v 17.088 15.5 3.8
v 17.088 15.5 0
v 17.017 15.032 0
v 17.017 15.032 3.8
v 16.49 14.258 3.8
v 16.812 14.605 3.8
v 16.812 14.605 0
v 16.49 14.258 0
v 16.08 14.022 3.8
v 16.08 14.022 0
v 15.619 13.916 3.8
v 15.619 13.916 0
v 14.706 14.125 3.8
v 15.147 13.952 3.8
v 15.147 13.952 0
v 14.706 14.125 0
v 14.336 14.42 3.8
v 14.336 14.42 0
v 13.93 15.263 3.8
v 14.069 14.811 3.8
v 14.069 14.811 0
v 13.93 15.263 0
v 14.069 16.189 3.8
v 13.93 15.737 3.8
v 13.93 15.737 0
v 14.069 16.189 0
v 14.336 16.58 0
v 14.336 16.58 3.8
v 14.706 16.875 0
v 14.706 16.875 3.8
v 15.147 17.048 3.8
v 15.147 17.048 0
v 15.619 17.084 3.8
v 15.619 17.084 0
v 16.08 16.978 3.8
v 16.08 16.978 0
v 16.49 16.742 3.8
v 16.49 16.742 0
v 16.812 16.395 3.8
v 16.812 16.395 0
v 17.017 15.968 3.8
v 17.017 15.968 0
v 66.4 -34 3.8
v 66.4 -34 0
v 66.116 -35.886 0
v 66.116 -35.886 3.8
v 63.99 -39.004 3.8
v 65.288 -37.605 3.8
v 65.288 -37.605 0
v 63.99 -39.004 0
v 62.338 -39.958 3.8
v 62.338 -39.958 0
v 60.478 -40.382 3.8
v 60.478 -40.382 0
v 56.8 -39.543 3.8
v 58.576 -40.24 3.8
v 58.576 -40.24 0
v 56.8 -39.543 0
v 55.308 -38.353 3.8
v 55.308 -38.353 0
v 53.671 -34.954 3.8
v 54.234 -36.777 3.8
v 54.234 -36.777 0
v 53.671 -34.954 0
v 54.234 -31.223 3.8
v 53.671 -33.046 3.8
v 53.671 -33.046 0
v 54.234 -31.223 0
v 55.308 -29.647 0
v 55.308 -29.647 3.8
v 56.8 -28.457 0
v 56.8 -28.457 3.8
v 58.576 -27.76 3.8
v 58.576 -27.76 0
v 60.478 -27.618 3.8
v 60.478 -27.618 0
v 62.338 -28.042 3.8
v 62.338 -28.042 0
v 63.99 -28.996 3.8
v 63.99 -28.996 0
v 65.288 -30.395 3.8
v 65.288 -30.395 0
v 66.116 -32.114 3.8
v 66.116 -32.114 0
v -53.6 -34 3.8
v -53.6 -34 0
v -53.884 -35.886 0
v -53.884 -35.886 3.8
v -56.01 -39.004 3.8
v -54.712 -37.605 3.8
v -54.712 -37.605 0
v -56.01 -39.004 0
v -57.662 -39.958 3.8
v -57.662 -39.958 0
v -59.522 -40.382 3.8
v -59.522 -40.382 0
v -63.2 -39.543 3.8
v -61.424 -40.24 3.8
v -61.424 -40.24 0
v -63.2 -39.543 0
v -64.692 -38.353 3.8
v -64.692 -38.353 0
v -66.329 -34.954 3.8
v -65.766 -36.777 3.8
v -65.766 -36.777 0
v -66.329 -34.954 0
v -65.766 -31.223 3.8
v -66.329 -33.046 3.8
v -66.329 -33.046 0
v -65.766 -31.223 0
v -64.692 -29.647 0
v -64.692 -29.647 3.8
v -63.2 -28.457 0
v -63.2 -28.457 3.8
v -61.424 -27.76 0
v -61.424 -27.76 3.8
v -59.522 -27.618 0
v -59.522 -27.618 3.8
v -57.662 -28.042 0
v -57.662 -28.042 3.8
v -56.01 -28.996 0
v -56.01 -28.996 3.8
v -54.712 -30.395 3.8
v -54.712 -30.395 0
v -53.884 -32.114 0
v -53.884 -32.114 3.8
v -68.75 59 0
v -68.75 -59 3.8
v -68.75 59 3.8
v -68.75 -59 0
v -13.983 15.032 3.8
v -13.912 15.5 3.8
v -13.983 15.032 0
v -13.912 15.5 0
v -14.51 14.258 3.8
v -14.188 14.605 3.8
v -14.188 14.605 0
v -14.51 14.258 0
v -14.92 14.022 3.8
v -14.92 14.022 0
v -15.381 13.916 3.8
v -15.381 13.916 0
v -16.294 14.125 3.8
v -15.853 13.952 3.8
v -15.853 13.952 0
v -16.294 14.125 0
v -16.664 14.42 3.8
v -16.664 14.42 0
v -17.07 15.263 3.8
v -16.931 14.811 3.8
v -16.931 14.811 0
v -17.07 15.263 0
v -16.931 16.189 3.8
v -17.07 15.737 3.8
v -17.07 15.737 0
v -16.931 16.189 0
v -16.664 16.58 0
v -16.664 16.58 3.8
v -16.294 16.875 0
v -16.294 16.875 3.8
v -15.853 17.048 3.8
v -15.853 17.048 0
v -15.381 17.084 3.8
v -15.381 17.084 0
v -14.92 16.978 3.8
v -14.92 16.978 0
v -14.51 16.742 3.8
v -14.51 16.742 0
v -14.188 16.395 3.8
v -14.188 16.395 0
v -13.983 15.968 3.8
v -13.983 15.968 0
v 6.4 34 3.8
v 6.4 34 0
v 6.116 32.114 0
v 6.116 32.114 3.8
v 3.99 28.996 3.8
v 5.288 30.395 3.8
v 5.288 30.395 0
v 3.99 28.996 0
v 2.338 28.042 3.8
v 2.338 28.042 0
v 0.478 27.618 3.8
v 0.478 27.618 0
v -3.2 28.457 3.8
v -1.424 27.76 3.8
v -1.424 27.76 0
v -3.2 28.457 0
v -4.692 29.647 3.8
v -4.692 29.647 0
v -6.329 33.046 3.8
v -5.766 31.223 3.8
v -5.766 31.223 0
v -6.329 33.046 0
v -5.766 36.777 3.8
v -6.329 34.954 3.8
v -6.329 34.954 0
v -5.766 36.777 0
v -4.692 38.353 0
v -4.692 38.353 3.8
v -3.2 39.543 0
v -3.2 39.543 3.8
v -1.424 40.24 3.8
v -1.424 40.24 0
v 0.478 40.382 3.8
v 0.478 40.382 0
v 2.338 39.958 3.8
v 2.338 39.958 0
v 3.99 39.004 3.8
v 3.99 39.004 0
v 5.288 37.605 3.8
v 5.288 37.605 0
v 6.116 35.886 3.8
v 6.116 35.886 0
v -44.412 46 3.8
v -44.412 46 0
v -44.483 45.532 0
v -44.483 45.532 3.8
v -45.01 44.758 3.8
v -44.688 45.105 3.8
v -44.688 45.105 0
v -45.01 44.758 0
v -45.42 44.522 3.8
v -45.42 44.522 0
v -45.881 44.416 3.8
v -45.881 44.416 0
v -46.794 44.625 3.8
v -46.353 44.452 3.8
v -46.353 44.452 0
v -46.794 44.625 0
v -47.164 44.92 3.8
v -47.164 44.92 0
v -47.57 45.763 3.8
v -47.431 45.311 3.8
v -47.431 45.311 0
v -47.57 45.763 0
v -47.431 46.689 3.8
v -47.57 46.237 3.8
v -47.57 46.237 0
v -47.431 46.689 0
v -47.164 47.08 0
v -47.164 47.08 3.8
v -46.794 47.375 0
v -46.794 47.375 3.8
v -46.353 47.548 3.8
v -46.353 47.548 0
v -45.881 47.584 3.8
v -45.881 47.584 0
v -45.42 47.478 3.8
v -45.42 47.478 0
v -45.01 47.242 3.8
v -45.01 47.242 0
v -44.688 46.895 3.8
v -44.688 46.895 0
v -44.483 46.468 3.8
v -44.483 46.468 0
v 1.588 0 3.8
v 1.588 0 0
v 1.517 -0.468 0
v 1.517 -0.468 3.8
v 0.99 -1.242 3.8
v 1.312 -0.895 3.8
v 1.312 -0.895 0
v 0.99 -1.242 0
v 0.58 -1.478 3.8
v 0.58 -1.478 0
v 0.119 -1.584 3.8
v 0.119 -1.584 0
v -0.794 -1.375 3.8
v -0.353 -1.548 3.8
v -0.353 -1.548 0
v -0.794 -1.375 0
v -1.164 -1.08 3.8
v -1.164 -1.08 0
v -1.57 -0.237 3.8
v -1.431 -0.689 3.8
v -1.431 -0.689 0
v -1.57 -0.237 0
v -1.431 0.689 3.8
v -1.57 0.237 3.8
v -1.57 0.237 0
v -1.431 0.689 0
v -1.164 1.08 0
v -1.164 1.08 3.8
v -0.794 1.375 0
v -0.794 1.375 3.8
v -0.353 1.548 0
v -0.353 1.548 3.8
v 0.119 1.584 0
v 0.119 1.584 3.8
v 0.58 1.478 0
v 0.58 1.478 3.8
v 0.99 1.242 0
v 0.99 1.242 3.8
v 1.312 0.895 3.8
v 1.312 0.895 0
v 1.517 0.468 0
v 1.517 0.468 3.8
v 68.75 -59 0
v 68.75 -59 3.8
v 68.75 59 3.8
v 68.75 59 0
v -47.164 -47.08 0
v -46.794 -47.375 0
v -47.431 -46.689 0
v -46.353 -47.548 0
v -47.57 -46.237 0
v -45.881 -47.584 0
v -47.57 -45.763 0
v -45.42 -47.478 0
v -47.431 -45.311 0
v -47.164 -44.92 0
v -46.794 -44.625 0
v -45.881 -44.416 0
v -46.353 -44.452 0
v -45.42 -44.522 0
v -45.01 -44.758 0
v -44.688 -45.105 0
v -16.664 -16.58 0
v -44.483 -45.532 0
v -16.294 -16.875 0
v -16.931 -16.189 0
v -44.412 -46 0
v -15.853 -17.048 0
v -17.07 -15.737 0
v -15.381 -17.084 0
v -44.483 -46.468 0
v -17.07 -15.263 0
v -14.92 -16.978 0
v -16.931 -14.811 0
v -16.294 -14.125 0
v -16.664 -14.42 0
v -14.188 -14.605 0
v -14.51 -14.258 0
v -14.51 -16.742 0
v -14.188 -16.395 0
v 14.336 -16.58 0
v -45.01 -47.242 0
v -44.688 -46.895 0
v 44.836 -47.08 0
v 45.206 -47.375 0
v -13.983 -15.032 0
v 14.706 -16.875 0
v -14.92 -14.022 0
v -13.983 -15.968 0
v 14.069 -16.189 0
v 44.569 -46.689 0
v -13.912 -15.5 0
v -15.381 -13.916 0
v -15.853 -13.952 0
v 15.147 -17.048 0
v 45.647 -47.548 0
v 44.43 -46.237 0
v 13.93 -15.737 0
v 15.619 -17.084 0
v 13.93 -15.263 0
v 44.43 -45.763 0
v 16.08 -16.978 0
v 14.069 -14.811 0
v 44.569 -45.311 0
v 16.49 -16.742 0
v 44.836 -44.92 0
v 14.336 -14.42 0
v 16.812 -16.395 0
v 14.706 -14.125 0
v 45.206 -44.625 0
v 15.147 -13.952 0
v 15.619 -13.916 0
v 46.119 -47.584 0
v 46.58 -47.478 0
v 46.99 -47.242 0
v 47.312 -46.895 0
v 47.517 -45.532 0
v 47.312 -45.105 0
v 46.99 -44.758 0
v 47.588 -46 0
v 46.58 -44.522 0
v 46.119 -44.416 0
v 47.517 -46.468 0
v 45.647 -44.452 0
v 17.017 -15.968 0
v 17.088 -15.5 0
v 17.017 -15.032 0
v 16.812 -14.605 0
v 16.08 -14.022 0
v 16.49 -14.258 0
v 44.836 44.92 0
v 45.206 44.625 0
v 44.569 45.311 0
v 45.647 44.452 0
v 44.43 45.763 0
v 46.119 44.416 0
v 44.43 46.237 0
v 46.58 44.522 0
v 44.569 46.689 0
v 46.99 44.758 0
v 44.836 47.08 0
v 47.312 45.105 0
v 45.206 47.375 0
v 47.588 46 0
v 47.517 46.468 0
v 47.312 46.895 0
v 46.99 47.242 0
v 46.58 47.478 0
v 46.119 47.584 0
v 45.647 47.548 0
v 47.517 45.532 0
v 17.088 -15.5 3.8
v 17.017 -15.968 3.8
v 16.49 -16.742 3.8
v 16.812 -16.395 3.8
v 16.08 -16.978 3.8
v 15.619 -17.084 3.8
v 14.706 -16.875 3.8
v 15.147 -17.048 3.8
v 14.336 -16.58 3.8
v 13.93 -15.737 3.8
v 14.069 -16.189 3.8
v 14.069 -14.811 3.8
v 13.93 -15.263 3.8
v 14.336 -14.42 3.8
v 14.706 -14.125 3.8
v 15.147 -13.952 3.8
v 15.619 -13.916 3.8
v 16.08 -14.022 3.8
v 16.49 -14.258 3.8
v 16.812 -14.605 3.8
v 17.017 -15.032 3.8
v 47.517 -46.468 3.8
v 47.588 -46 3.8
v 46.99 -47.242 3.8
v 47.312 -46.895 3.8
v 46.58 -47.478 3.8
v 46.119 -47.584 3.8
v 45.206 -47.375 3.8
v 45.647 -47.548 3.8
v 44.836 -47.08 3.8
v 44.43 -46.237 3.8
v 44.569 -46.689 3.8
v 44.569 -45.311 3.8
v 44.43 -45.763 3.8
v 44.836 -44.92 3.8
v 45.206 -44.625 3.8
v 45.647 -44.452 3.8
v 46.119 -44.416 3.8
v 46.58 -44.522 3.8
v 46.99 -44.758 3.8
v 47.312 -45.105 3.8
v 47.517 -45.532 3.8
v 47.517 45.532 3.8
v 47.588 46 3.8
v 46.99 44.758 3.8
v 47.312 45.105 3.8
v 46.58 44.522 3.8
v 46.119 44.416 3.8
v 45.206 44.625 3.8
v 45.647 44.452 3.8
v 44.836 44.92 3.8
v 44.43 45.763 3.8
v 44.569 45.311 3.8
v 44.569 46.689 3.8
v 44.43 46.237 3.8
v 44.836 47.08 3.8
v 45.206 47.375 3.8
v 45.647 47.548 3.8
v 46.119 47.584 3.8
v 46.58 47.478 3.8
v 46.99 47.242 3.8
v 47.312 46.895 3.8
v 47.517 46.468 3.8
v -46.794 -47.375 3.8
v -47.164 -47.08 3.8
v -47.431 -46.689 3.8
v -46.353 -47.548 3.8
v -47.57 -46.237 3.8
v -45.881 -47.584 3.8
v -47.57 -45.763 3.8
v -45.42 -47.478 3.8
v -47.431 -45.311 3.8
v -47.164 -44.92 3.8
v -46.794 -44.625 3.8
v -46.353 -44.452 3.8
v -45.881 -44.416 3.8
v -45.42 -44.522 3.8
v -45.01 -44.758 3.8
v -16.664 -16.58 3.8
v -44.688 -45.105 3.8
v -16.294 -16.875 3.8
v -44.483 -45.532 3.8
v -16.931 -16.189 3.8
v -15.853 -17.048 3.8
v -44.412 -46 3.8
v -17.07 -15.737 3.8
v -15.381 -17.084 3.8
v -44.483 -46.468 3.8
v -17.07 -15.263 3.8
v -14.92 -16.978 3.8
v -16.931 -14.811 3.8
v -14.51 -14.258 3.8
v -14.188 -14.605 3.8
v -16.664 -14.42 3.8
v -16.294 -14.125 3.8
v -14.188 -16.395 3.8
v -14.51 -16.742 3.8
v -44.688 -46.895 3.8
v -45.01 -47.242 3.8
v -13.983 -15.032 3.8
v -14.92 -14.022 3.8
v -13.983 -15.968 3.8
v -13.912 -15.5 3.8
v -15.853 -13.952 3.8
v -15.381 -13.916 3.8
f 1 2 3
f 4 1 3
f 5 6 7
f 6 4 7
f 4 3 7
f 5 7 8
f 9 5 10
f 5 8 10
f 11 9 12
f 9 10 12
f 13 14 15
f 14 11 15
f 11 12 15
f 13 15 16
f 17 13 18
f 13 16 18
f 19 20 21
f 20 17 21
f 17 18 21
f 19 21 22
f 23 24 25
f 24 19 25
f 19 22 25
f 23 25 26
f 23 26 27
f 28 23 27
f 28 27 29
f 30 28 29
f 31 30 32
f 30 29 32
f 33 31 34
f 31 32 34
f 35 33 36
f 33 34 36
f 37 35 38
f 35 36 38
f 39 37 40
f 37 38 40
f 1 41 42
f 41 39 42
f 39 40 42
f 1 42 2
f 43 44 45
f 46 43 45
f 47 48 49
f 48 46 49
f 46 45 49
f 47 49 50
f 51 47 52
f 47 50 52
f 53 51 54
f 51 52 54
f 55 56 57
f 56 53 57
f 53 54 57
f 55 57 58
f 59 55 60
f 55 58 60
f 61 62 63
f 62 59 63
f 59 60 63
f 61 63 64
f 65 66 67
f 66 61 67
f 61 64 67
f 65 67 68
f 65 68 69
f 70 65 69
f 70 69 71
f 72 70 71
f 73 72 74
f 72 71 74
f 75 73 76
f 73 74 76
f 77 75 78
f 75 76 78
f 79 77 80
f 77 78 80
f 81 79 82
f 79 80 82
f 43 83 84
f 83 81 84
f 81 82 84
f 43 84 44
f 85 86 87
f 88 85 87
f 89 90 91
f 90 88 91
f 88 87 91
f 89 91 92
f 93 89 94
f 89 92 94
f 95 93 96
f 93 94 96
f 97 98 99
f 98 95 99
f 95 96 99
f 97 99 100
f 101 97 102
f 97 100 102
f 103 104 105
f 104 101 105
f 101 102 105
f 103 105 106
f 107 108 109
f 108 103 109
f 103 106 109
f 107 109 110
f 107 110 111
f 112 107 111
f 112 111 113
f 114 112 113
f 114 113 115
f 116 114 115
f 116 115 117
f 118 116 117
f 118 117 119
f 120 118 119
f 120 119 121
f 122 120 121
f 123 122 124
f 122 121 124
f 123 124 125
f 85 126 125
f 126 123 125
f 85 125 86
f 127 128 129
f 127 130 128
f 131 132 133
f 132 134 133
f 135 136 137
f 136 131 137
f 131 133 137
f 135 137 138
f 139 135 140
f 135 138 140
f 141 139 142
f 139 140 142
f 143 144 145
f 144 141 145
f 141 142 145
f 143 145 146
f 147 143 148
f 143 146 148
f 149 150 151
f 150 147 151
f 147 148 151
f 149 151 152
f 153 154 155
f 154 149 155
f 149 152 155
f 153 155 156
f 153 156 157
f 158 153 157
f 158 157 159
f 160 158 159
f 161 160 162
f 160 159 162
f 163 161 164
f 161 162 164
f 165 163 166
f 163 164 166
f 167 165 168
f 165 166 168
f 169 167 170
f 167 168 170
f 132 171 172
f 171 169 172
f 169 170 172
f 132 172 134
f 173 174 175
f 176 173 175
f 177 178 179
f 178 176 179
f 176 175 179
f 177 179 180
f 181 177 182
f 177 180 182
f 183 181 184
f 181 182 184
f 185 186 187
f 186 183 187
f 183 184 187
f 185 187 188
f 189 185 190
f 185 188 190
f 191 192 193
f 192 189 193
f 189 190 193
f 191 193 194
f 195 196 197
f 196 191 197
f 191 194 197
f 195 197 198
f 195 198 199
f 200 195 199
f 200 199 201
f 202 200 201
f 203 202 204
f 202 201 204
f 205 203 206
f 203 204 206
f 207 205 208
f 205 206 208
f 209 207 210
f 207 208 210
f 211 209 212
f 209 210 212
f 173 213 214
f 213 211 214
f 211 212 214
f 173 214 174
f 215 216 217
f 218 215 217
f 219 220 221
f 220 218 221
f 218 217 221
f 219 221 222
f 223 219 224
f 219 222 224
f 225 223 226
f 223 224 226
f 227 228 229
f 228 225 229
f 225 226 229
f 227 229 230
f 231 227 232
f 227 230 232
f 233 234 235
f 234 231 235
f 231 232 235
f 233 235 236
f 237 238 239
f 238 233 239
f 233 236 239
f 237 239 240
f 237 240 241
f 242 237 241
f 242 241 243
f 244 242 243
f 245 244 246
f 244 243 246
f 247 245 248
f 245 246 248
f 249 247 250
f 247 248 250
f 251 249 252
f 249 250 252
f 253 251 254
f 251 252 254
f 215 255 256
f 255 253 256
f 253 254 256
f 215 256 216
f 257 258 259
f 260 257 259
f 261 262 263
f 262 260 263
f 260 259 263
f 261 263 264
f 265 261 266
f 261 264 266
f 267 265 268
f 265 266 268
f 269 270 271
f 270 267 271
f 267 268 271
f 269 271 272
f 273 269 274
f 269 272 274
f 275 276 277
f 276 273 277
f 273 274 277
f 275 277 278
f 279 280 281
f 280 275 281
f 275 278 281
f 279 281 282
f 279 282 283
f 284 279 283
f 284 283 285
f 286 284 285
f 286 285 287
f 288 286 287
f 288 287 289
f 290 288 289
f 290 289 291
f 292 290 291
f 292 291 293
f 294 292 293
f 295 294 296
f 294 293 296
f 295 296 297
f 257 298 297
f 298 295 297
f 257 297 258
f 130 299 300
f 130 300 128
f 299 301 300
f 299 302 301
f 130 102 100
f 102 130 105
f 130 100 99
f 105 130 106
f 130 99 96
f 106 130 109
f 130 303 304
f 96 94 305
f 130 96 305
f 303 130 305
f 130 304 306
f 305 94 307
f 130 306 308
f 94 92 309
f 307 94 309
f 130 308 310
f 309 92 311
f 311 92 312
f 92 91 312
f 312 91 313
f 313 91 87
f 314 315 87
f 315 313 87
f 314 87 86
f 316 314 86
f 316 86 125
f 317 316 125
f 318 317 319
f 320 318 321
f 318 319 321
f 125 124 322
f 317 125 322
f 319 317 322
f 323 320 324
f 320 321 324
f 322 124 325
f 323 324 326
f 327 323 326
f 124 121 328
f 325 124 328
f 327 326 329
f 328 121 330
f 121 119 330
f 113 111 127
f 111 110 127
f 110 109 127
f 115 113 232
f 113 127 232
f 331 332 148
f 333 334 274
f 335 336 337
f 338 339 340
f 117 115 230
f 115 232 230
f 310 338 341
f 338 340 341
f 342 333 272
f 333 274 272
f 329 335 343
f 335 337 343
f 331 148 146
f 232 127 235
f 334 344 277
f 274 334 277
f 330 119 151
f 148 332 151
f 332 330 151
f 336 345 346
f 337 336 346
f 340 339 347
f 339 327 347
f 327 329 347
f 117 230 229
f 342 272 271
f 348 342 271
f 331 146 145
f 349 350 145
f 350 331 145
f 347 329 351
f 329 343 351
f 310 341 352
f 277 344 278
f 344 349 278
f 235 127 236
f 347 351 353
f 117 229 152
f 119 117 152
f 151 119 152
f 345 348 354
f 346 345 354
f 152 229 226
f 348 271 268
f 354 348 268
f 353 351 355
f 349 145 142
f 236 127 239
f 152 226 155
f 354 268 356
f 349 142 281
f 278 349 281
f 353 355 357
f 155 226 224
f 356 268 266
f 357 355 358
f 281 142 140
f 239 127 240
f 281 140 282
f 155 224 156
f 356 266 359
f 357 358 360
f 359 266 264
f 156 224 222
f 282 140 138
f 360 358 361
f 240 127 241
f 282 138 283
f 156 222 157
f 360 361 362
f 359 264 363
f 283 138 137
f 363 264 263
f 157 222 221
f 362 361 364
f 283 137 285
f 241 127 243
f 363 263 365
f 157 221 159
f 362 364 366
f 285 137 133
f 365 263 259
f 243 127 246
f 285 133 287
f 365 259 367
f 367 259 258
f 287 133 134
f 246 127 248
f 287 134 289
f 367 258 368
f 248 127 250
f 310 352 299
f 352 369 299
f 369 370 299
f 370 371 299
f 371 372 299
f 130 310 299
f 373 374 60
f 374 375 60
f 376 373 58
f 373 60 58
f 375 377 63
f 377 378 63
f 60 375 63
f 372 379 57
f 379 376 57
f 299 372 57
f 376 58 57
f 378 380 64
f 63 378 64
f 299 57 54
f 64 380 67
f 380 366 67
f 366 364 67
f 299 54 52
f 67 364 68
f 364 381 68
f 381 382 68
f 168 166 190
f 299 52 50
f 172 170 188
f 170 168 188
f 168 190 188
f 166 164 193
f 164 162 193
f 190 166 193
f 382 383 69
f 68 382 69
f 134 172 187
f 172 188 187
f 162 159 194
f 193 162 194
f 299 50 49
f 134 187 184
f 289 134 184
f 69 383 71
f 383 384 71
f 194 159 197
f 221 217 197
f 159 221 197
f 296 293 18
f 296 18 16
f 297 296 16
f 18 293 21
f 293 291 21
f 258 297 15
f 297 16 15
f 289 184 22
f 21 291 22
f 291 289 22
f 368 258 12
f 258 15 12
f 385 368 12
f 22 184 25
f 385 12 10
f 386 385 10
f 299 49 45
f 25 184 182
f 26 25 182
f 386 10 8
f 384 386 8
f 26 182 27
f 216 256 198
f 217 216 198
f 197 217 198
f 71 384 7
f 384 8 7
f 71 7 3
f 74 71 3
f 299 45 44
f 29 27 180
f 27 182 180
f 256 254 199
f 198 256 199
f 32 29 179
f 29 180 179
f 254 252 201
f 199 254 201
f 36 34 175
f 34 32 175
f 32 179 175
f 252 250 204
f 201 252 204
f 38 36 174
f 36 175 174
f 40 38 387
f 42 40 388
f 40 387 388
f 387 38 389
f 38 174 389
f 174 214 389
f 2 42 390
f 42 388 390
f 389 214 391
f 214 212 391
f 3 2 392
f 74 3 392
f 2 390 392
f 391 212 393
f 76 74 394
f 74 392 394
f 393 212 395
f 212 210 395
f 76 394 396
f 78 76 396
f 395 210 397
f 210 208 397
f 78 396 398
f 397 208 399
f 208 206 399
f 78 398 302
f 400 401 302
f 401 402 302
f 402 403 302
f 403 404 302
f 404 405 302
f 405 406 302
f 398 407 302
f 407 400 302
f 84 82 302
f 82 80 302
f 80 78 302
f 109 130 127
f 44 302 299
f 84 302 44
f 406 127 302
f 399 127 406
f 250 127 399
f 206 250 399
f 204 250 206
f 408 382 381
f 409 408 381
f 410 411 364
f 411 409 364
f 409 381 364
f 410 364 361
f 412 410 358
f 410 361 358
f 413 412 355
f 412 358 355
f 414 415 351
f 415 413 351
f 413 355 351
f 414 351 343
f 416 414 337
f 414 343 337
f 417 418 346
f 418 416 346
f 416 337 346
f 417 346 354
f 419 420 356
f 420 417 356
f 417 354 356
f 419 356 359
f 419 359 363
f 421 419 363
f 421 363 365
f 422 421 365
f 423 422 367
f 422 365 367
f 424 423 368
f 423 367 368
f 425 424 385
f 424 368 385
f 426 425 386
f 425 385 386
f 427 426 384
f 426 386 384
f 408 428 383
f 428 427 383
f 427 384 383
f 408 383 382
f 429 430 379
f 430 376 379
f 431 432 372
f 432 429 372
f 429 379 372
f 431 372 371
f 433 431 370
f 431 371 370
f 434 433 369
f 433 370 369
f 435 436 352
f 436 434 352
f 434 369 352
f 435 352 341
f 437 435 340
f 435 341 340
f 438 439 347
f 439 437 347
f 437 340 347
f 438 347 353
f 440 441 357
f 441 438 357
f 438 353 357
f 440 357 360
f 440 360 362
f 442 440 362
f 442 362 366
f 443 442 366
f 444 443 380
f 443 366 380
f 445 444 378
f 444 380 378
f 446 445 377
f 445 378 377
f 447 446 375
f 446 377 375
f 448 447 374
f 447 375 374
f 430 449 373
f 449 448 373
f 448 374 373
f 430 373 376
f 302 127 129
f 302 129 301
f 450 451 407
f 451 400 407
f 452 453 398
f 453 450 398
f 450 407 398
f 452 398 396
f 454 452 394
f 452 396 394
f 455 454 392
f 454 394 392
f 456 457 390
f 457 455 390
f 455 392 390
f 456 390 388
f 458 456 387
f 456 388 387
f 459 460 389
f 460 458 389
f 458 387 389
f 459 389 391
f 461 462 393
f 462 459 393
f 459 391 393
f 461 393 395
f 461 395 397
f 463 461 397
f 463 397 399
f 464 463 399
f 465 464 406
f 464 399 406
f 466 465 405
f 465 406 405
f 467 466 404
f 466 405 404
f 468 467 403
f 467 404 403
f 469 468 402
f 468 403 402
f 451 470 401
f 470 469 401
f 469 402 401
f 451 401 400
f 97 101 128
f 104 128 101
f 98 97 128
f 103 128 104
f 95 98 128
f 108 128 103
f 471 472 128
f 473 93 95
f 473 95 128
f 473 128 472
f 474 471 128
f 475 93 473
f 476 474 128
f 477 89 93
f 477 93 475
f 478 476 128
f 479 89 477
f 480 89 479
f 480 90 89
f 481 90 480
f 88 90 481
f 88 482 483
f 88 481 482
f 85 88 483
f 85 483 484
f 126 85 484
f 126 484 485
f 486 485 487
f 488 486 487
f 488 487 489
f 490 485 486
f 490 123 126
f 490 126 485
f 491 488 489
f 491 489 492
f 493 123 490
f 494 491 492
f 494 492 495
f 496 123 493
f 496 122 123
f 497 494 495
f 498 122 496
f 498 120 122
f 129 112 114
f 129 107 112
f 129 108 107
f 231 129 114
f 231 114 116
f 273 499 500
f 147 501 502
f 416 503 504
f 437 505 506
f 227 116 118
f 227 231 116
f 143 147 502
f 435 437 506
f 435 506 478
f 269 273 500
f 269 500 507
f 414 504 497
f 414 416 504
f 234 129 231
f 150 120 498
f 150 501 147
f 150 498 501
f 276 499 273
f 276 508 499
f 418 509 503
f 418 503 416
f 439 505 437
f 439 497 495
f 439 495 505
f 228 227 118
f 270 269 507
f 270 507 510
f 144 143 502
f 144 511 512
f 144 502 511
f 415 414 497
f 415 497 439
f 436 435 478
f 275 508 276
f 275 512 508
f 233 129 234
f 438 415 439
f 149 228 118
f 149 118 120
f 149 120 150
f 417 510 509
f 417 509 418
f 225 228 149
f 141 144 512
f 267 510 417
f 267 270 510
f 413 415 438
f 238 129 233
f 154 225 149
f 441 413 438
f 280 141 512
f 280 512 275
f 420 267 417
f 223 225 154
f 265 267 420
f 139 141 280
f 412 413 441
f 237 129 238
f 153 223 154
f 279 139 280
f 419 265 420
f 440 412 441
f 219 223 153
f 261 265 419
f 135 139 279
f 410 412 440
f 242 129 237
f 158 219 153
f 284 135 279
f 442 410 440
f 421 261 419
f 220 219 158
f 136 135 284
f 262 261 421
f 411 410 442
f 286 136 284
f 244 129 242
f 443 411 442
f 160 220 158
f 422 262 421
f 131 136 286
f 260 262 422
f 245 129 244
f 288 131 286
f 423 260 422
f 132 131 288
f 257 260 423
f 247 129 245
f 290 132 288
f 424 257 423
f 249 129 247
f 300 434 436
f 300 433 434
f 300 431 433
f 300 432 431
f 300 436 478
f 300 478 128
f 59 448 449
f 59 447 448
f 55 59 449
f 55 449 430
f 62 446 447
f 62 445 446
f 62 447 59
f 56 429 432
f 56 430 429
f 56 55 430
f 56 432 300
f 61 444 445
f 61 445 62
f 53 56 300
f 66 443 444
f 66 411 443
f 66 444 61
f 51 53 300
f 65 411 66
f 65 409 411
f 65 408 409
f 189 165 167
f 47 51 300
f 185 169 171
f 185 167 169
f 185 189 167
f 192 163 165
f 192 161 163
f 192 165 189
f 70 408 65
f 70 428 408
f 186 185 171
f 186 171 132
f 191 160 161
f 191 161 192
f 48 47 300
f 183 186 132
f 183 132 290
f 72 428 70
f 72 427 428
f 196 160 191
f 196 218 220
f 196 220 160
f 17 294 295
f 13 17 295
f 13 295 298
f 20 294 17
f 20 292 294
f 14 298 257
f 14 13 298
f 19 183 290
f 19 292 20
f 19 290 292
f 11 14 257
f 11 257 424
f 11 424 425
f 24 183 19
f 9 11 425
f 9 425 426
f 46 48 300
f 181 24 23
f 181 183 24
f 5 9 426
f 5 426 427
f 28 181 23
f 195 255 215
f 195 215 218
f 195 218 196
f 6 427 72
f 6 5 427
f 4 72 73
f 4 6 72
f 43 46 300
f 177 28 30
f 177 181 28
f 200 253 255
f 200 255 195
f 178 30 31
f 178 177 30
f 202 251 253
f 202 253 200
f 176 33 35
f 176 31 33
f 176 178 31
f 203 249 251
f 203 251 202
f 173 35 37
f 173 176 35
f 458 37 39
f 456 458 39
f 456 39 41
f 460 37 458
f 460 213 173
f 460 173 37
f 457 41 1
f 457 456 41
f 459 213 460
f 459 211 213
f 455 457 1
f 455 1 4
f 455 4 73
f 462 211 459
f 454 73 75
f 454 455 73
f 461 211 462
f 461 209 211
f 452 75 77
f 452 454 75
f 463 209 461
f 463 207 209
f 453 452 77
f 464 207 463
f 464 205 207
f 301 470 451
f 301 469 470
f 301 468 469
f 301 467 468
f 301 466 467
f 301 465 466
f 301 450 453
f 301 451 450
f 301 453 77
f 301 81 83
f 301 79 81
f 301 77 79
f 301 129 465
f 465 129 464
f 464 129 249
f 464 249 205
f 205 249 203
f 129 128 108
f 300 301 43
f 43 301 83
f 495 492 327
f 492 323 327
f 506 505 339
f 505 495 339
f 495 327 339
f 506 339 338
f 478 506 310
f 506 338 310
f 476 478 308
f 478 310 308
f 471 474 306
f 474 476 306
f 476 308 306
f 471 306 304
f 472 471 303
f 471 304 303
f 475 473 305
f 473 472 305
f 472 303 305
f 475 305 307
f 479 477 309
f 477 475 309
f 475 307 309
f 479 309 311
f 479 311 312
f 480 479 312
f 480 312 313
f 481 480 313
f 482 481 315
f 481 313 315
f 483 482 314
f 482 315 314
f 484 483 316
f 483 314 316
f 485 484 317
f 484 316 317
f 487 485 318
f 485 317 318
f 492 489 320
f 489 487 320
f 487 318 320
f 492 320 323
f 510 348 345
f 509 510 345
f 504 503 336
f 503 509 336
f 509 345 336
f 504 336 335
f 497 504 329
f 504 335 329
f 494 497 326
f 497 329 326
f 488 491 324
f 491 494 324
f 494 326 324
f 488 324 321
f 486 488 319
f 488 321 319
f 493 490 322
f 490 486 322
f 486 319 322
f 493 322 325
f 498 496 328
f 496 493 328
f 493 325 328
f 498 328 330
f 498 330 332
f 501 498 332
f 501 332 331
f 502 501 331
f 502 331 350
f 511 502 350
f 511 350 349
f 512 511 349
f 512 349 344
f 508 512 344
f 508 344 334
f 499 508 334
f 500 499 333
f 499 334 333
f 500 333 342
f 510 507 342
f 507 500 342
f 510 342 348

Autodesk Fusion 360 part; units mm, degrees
sketch "movingPlatform" plane through (0, 0, 0) normal (0, 0, 1) x (1, 0, 0)
  line L0 (-68.75, 59) -> (68.75, 59)
  line L1 (68.75, 59) -> (68.75, -59)
  line L2 (68.75, -59) -> (-68.75, -59)
  line L3 (-68.75, -59) -> (-68.75, 59)
  line L4 (-68.75, 59) -> (68.75, -59) construction
  line L5 (68.75, 59) -> (-68.75, -59) construction
  circle A0 centre (-60, -34) radius 6.4
  line L6 (0, 2.5) -> (0, 20)
  circle A1 centre (60, -34) radius 6.4
  circle A2 centre (0, 34) radius 6.4
  circle A3 centre (-46, -46) radius 1.588
  circle A4 centre (-15.5, -15.5) radius 1.588
  circle A5 centre (0, 0) radius 57 construction
  circle A6 centre (15.5, -15.5) radius 1.588
  circle A7 centre (15.5, 15.5) radius 1.588
  circle A8 centre (46, -46) radius 1.588
  circle A9 centre (-46, 46) radius 1.588
  circle A10 centre (46, 46) radius 1.588
  circle A11 centre (-15.5, 15.5) radius 1.588
  circle A12 centre (0, 0) radius 1.588
  dimension "d1" = 137.5
  dimension "d2" = 118
  dimension "d3" = 12.8
  dimension "d4" = 120
  dimension "d5" = 12.8
  dimension "d6" = 68
  dimension "d7" = 25
  dimension "d8" = 25
  dimension "d9" = 3.176
  dimension "d12" = 92
  dimension "d13" = 92
  dimension "d21" = 3.176
  dimension "d24" = 31
  dimension "d25" = 31
  dimension "d27" = 15.5
  dimension "d31" = 114
  dimension "d34" = 46
  dimension "d37" = 46
  dimension "d49" = 15.5
  dimension "d52" = 3.176
extrude "Extrude3" add sketch "movingPlatform" along normal blind 3.8
equation "d4 = 132.800 mm - 12.8 mm"
